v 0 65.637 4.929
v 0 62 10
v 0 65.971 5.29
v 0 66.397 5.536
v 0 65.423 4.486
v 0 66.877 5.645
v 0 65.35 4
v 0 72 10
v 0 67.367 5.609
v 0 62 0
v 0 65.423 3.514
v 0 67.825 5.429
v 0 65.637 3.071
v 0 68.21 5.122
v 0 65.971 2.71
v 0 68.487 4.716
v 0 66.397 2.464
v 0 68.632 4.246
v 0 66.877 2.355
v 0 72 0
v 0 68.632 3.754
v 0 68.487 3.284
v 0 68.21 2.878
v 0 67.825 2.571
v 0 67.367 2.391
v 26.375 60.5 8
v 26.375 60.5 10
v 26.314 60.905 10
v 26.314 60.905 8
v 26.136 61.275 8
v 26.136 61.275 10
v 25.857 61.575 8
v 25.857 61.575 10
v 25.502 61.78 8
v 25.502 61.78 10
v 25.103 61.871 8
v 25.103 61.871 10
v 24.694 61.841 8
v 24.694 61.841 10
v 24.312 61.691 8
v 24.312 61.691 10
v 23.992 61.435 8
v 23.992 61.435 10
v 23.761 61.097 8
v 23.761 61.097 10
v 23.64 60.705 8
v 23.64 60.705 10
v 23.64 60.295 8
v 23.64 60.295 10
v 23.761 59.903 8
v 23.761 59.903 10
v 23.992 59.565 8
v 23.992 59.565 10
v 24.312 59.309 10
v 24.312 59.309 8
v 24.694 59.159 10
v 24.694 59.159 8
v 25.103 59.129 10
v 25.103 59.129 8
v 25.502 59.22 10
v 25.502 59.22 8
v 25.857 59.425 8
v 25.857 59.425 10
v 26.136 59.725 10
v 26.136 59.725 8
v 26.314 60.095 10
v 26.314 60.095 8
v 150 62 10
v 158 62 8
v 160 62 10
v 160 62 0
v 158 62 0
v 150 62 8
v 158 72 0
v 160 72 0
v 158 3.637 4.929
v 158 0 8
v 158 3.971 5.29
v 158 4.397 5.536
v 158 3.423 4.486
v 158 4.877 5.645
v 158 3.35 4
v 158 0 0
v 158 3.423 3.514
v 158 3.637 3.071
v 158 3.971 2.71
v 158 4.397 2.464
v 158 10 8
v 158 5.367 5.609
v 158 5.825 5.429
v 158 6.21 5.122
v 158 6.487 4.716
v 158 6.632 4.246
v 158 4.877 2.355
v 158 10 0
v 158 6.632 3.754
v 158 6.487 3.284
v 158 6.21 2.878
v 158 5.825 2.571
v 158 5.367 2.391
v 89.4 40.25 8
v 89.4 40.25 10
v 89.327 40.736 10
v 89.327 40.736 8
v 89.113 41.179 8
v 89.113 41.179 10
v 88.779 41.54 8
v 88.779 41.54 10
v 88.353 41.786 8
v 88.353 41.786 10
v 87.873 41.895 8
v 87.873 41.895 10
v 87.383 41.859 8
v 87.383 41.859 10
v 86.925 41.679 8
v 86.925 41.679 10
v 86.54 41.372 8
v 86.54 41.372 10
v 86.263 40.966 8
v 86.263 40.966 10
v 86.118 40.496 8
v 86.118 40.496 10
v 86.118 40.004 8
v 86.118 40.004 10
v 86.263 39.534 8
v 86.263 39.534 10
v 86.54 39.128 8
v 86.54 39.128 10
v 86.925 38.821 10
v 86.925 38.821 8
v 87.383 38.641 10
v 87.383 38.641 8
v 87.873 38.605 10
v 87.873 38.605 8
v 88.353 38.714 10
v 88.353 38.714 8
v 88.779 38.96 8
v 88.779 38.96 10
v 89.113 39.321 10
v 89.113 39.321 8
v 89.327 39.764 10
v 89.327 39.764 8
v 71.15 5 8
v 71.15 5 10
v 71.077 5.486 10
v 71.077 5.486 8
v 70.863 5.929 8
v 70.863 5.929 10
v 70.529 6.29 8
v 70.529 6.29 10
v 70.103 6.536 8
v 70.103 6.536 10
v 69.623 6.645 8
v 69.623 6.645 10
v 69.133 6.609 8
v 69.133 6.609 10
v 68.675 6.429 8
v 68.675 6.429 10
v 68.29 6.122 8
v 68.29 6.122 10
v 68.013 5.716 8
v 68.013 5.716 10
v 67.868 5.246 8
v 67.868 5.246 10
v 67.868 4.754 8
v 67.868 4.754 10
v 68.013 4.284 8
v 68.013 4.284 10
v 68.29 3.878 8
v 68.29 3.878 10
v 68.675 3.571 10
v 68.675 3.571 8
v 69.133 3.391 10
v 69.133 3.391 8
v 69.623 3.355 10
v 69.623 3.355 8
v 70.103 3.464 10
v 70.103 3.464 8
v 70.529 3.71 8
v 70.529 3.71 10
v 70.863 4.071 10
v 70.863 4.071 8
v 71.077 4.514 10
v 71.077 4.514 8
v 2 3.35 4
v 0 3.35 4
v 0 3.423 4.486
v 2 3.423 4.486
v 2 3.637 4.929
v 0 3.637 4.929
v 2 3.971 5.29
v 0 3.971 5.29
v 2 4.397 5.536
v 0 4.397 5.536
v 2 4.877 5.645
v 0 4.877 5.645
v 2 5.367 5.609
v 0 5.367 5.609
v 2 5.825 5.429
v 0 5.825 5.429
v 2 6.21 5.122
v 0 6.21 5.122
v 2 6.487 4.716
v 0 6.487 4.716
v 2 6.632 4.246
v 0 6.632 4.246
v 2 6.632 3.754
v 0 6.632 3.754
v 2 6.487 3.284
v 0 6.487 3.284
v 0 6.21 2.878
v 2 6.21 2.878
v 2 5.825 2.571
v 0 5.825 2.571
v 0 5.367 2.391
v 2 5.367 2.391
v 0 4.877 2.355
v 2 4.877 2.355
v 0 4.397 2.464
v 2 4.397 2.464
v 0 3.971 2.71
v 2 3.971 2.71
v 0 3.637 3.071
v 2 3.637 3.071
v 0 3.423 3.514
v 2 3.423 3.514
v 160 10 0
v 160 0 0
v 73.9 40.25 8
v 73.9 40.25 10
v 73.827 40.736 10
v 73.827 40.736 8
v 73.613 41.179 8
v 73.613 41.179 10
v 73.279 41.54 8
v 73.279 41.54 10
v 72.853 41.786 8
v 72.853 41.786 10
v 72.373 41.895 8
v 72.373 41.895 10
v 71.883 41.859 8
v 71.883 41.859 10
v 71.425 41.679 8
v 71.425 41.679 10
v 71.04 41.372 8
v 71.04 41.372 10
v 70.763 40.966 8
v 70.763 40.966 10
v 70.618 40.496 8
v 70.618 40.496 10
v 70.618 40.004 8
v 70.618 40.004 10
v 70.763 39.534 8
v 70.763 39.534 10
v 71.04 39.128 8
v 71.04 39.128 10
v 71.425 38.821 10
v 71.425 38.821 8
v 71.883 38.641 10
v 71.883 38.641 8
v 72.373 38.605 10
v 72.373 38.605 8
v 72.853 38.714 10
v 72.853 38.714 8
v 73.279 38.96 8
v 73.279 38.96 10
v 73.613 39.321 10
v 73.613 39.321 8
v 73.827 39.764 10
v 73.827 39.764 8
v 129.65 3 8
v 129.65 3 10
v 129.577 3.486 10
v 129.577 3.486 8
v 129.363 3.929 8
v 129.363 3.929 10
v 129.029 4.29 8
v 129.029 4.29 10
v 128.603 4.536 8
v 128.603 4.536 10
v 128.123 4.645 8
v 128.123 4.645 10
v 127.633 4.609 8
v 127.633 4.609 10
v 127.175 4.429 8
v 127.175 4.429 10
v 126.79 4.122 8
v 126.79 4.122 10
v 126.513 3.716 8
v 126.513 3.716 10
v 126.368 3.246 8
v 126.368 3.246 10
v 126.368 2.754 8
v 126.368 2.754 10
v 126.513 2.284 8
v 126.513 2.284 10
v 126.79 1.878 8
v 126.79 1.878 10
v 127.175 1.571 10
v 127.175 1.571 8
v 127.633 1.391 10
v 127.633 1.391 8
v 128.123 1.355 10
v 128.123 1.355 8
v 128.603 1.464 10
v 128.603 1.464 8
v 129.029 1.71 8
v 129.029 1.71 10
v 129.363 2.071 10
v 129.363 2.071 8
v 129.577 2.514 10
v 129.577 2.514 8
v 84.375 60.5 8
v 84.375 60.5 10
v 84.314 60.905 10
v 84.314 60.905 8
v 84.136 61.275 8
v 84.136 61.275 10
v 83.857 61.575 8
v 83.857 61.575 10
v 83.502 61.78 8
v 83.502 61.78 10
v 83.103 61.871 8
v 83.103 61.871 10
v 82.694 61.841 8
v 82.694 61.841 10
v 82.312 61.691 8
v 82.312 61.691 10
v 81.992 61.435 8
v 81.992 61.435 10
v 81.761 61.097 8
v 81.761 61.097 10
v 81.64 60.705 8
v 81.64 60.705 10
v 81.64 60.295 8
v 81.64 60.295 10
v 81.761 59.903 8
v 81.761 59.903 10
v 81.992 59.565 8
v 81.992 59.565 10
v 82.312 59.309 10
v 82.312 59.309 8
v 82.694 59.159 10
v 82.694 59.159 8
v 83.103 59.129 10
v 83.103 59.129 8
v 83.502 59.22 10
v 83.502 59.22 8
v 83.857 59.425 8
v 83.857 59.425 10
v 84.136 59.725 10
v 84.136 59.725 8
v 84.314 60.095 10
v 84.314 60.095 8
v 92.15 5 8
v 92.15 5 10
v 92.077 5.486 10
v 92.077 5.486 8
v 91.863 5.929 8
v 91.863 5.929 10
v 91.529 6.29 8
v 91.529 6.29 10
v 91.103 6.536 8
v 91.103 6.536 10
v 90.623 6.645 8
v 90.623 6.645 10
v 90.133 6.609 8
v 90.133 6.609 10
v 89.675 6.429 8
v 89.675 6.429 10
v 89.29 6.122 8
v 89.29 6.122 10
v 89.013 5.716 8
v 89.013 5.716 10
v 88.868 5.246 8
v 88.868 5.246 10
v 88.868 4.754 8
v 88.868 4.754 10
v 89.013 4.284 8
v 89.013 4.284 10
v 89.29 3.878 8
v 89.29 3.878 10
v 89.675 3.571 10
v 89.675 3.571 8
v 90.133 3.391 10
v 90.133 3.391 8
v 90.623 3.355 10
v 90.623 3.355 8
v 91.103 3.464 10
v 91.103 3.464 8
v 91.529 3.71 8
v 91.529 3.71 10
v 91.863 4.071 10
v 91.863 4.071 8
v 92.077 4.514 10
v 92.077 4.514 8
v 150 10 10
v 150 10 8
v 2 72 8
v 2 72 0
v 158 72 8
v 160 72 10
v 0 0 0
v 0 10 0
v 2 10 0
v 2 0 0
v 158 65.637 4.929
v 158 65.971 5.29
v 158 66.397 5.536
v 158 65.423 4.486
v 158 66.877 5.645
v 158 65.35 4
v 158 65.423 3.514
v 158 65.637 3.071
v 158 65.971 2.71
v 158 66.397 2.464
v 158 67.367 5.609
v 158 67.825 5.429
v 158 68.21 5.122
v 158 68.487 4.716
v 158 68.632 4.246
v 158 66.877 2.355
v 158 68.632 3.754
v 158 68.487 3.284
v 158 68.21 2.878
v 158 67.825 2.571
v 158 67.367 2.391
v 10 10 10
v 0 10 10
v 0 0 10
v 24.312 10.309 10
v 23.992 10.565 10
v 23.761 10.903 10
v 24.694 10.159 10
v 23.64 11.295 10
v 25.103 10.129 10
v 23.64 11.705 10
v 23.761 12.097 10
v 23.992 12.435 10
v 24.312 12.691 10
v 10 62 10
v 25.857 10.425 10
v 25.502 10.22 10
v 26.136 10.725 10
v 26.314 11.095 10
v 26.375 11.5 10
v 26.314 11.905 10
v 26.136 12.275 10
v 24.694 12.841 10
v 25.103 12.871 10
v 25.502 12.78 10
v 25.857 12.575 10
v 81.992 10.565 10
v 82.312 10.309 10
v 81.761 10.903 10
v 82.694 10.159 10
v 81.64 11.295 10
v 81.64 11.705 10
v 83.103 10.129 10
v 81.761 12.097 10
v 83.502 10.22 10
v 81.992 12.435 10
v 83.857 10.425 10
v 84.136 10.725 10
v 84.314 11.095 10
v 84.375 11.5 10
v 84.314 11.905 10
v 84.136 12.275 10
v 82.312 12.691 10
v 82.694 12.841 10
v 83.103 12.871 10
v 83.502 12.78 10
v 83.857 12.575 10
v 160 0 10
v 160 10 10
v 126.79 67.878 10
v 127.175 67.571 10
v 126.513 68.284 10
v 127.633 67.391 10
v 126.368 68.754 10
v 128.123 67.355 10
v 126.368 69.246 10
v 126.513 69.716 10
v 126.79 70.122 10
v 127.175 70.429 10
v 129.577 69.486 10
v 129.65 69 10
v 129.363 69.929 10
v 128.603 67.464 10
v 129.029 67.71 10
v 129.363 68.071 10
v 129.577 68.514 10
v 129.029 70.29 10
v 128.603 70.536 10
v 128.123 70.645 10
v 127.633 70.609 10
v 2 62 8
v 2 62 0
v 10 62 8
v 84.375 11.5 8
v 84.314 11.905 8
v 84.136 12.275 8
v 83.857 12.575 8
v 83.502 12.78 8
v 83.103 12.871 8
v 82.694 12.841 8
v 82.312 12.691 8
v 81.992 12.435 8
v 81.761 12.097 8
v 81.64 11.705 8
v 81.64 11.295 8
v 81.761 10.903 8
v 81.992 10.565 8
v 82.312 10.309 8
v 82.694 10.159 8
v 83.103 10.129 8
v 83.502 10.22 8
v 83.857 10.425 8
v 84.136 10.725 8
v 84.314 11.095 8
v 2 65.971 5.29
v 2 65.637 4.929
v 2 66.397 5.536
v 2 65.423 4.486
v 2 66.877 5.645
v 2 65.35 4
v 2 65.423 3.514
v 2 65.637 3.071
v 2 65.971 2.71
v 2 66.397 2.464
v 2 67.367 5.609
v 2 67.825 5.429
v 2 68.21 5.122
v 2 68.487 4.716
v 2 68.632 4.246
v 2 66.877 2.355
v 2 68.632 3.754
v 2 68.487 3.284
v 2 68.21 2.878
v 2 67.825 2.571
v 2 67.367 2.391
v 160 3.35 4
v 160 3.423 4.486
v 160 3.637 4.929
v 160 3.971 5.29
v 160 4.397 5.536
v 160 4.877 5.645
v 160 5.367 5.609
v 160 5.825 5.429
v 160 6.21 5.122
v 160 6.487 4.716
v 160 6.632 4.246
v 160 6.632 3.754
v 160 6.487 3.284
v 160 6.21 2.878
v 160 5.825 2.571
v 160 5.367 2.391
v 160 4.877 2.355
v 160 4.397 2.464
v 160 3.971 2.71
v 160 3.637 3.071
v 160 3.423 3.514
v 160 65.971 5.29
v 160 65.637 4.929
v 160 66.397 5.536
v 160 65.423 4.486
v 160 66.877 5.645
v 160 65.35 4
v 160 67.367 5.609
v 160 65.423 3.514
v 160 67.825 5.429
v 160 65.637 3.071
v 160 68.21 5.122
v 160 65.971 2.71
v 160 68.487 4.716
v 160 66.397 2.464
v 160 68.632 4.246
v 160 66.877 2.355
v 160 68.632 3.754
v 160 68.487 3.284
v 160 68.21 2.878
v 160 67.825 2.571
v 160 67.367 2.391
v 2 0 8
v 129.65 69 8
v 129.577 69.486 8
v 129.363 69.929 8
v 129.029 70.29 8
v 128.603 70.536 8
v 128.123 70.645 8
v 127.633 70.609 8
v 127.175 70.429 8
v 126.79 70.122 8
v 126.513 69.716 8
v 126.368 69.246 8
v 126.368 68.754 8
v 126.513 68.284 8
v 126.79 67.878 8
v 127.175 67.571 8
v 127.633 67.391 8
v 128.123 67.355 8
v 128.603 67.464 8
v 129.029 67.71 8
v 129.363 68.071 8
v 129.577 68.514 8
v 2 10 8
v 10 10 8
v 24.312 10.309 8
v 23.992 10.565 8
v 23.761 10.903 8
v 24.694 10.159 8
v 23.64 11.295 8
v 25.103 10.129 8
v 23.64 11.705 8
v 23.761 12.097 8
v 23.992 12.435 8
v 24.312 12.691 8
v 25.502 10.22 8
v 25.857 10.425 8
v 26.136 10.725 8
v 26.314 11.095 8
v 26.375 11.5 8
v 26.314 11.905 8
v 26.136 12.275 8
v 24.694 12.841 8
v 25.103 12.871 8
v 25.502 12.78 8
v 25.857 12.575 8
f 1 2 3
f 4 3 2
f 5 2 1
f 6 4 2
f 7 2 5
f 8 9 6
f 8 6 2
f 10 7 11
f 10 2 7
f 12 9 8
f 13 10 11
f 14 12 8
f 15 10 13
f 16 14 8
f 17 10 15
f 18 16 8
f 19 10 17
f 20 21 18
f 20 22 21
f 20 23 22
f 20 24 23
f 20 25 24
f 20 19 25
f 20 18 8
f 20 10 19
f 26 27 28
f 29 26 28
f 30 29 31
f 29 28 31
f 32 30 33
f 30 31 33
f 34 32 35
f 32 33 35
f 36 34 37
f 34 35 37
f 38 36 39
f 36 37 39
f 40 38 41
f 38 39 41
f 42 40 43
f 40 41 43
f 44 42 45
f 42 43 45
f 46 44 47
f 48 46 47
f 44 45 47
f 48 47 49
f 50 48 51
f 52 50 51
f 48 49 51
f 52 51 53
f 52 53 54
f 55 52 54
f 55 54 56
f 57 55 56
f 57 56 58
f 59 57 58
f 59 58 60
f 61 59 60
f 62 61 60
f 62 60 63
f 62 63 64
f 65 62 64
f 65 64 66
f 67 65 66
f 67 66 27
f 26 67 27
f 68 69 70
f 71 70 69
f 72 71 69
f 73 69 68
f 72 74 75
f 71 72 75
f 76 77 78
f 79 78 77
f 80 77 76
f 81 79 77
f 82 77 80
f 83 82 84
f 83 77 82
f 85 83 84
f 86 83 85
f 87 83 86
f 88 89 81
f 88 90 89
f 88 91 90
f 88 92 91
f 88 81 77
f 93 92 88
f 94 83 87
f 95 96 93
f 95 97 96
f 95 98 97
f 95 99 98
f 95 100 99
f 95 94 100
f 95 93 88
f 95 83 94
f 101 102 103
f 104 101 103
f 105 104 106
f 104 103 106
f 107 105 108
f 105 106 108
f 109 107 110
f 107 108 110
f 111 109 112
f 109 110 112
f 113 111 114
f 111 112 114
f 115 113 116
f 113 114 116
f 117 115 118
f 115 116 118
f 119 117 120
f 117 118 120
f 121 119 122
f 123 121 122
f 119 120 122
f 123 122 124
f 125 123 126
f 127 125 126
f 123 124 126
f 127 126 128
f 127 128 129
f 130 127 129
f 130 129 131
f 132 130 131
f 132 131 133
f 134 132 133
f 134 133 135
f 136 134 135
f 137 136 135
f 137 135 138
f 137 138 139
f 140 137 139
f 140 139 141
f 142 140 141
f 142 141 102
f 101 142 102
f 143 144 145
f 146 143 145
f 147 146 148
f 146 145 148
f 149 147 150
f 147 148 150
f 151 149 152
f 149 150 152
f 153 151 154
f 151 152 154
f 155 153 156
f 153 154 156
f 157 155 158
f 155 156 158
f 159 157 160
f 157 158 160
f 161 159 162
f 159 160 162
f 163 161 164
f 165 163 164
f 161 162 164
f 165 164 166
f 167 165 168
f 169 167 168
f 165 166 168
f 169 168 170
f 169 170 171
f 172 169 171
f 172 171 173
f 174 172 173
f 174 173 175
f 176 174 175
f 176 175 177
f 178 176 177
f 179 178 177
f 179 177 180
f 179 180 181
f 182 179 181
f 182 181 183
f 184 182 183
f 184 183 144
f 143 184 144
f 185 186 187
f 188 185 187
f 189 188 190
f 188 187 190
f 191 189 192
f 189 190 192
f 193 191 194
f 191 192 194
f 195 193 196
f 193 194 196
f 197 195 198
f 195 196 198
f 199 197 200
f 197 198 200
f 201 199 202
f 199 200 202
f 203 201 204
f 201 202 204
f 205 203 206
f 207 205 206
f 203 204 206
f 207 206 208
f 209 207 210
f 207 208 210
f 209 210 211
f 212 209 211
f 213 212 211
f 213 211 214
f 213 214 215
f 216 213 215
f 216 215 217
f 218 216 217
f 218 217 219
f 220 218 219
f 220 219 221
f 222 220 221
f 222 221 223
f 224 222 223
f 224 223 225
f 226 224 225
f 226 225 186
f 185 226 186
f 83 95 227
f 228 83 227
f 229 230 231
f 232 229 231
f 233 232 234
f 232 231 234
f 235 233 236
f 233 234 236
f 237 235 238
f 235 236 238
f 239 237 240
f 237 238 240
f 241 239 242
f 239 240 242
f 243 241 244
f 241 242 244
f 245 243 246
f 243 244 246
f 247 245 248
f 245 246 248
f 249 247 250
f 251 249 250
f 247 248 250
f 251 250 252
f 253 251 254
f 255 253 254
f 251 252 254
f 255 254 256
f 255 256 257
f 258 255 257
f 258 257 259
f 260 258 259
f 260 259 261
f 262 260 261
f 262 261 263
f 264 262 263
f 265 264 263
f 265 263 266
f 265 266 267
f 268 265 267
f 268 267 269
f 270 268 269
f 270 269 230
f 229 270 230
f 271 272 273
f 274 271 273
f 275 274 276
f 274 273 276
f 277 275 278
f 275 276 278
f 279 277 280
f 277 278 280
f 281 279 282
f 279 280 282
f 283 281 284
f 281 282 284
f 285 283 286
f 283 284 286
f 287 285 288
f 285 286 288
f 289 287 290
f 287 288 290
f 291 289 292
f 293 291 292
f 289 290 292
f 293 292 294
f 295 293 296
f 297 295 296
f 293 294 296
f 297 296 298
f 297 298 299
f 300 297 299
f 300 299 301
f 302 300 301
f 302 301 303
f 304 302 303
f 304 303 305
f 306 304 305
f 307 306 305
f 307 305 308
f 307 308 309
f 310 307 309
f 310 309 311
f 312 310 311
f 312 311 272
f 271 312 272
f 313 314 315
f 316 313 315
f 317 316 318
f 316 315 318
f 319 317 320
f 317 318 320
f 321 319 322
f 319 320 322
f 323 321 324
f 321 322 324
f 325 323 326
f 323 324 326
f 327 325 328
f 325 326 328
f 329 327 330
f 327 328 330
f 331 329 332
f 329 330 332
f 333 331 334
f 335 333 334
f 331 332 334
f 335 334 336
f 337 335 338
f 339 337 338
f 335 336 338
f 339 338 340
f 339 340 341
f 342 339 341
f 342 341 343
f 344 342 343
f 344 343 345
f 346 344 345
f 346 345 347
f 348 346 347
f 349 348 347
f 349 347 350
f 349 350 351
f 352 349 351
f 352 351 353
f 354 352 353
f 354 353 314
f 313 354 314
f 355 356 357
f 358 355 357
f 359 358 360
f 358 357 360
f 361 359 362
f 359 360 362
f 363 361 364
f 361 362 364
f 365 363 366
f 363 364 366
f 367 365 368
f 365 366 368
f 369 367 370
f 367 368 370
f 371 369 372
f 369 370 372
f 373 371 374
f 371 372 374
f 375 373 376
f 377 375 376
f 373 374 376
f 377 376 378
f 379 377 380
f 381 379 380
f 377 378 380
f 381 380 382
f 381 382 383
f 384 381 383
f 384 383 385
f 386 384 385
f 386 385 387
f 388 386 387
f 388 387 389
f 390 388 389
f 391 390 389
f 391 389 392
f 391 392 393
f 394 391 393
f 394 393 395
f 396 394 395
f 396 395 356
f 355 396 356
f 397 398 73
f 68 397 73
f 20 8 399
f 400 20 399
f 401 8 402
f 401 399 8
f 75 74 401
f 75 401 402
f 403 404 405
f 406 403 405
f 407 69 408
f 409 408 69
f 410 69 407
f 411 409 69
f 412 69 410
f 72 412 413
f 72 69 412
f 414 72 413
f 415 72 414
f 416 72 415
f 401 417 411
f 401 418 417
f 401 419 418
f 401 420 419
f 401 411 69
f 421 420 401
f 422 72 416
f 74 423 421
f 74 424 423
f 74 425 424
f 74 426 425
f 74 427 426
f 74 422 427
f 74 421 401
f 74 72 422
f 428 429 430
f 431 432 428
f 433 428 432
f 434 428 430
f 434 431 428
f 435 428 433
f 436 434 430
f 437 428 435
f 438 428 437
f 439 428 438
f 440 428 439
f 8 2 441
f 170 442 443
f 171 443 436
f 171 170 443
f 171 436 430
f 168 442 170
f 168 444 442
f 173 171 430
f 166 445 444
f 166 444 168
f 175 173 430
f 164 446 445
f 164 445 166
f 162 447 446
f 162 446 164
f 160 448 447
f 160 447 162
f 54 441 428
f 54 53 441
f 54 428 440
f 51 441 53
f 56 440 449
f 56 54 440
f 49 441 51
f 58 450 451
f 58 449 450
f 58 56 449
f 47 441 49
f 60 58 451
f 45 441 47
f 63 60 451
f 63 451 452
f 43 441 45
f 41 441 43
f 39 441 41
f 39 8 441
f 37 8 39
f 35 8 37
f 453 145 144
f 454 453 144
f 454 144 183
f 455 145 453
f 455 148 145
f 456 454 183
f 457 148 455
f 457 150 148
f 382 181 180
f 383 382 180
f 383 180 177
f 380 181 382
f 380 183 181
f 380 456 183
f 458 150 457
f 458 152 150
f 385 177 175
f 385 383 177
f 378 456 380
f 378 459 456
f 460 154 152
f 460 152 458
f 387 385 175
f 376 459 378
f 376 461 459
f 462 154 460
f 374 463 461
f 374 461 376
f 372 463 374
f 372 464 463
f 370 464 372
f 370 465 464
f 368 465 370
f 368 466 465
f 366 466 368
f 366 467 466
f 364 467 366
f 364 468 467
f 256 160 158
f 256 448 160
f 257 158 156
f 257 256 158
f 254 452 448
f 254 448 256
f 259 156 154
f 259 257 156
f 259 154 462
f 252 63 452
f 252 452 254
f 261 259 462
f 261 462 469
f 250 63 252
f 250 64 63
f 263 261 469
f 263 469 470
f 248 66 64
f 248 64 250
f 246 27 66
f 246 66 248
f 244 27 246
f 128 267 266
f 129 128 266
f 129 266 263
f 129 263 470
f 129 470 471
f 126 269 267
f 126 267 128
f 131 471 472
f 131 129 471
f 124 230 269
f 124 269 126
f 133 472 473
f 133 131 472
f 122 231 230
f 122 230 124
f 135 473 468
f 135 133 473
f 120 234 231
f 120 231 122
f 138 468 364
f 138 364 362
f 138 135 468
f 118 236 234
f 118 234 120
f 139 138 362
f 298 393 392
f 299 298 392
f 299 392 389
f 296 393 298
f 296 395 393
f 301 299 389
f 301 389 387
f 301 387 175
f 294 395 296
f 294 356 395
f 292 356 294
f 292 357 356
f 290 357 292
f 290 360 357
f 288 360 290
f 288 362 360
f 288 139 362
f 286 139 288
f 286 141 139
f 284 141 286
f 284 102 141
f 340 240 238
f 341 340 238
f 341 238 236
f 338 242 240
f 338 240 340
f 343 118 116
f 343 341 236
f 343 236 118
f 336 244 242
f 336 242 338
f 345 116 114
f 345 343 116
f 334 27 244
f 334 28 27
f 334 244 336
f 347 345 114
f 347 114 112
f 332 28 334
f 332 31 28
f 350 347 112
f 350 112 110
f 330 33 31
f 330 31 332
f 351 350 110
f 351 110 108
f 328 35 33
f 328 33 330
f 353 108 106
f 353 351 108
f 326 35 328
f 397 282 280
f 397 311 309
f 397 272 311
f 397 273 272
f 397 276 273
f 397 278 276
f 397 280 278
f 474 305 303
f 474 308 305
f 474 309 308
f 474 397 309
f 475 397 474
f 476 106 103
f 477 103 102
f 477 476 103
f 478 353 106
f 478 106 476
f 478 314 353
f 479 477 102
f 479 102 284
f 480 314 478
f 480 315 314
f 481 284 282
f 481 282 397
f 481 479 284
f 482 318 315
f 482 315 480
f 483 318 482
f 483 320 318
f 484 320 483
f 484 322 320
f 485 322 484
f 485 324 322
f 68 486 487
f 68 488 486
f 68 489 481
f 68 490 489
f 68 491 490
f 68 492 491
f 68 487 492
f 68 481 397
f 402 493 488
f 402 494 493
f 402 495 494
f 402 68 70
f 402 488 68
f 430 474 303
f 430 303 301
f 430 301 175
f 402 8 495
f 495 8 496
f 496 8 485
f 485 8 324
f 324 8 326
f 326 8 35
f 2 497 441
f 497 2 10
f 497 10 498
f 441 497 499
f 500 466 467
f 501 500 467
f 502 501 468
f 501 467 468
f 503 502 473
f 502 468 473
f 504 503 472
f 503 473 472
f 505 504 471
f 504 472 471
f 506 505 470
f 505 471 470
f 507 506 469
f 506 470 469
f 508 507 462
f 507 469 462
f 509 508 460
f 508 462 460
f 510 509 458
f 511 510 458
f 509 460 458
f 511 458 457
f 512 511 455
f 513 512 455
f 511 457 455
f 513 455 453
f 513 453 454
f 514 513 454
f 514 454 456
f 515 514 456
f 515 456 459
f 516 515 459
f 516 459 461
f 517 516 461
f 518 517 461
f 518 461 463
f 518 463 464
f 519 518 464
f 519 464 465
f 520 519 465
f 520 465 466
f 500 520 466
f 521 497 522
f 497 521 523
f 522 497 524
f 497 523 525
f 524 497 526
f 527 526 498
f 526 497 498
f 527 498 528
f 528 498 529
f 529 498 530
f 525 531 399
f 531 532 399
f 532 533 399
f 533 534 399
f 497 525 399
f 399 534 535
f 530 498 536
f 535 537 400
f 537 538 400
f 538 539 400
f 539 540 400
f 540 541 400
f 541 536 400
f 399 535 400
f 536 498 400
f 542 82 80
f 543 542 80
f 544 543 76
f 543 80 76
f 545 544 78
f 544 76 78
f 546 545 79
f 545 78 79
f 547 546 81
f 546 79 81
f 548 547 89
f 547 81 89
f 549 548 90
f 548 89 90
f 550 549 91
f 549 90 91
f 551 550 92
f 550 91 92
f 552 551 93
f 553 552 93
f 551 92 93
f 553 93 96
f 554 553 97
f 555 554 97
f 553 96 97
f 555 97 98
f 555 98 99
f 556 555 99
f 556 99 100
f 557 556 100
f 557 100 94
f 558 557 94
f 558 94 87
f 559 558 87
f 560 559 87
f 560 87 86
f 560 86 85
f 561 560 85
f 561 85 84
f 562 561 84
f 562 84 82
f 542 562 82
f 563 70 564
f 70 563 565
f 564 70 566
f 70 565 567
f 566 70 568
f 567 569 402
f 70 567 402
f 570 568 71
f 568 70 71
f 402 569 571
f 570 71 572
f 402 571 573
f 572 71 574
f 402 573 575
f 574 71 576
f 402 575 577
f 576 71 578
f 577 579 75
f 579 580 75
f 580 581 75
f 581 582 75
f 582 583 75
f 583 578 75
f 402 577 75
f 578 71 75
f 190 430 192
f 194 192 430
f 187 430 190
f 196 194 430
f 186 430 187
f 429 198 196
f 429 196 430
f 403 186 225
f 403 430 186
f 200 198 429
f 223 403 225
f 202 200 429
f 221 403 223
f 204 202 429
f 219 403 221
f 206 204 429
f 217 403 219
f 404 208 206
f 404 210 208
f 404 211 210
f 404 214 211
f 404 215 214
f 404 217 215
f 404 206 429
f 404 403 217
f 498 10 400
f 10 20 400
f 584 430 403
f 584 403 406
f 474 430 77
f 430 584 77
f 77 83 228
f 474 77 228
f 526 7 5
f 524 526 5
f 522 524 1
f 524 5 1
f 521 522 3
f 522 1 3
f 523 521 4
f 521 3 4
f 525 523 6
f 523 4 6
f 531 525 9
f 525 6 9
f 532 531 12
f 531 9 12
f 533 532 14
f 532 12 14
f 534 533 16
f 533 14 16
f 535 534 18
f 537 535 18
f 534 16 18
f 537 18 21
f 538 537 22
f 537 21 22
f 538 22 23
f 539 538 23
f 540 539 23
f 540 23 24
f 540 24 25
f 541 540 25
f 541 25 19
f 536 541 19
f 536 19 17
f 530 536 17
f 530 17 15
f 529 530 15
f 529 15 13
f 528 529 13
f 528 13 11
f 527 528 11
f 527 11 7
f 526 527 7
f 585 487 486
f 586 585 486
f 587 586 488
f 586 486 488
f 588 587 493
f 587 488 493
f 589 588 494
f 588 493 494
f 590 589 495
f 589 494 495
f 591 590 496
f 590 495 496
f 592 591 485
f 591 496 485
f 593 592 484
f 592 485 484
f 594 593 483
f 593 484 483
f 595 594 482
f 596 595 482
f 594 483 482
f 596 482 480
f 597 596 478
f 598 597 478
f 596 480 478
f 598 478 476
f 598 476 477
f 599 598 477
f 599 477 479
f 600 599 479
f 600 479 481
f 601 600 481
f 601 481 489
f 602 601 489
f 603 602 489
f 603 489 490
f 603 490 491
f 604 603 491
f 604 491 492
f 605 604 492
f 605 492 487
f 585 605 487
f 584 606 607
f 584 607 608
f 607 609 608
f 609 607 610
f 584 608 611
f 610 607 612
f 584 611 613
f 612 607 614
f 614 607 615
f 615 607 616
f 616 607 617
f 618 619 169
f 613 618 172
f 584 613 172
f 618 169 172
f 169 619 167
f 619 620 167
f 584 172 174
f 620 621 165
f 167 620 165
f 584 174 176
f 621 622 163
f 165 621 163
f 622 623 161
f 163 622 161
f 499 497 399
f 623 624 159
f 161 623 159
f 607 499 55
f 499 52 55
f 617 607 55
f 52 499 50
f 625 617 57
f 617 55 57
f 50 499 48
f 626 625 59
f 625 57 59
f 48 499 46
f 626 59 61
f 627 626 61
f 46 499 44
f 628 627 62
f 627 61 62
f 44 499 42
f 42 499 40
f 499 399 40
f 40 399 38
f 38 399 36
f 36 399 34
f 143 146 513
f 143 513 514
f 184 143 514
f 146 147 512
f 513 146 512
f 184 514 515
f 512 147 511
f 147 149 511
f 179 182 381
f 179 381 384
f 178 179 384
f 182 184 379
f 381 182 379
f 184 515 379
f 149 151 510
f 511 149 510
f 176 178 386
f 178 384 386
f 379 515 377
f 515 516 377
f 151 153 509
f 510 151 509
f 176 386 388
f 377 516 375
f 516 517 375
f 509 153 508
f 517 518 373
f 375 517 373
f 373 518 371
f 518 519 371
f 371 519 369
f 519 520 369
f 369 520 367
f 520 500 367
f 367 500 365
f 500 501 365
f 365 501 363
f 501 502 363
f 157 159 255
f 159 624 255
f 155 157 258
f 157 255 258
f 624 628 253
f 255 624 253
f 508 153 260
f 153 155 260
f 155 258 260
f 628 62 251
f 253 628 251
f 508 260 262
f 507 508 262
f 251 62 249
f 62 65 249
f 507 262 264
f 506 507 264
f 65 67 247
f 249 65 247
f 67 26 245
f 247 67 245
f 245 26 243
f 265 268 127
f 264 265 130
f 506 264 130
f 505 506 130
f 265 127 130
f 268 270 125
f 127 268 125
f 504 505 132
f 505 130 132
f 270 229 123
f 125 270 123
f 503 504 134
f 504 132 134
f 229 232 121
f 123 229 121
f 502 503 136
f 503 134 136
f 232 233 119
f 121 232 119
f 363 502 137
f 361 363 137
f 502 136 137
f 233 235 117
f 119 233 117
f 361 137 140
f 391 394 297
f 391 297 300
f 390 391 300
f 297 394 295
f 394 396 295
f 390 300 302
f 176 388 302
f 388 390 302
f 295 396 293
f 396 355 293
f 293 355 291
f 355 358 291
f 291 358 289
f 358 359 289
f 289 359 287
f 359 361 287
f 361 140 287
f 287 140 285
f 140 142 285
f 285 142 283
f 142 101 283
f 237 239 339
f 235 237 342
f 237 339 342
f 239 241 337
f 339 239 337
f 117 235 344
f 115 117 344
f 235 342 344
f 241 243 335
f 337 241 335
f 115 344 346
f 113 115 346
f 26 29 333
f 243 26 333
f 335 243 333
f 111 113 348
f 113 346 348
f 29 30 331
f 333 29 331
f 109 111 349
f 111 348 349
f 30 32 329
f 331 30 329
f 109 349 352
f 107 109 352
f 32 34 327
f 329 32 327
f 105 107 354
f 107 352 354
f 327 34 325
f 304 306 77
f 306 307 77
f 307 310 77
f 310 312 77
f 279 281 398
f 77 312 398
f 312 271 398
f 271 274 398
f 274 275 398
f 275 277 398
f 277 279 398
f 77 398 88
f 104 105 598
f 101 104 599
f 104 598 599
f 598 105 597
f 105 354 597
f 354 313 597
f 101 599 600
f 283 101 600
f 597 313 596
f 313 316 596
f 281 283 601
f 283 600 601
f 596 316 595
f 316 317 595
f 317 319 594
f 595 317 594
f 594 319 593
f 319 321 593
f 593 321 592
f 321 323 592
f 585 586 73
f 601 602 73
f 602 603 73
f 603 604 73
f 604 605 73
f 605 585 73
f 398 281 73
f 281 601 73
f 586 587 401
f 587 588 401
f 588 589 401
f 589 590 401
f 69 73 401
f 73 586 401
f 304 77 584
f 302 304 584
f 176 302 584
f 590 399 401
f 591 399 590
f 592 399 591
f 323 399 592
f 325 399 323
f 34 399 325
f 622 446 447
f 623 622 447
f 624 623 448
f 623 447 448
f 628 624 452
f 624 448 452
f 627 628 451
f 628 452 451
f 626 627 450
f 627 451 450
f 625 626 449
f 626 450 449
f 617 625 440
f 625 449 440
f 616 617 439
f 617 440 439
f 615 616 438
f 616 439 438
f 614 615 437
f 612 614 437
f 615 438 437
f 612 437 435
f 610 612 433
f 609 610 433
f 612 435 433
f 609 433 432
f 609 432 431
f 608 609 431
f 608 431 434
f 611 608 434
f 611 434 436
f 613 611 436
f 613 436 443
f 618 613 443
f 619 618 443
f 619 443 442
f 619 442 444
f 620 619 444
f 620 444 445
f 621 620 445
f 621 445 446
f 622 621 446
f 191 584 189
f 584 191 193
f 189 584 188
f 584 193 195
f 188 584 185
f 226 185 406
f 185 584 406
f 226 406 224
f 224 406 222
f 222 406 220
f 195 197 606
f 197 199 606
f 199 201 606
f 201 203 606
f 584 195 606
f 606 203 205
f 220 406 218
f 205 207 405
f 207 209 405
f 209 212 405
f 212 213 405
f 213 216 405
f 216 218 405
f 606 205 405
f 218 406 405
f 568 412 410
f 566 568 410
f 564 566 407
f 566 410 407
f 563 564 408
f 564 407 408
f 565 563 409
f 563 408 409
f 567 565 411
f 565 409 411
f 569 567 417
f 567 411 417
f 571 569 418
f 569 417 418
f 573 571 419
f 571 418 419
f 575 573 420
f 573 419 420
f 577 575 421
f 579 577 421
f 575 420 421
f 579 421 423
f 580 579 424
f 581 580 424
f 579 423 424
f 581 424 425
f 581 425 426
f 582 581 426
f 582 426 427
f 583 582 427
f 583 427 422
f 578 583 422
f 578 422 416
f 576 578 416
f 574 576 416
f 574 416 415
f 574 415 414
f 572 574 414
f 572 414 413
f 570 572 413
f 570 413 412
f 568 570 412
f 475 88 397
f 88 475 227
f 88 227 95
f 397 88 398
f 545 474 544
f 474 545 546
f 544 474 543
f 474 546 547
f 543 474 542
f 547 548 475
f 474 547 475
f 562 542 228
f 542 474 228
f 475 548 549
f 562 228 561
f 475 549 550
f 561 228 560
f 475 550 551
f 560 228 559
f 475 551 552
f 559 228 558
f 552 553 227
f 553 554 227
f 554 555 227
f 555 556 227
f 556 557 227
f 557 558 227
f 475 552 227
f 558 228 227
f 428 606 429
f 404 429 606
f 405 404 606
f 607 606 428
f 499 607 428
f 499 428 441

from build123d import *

# Parameters (mm, degrees)
BOX002_W      = 156
BOX002_H      = 72
BOX002_DEPTH  = 8
BOX001_W      = 10
BOX001_H      = 52
BOX001_DEPTH  = 10
BOX_W         = 160
BOX_H         = 72
BOX_DEPTH     = 10
SKETCH_R      = 1.65
HOLE_DEPTH    = 160.001
SKETCH001_R   = 1.65
HOLE001_DEPTH = 10.001
SKETCH002_R   = 1.375
HOLE002_DEPTH = 10.001
SKETCH003_R   = 1.65
HOLE003_DEPTH = 25


with BuildPart() as w_rfel002:
    # Box002 → Box002 (new body)
    with BuildSketch(Plane(origin=(2, 0, 0), x_dir=(1, 0, 0), z_dir=(0, 0, 1))):
        with Locations((78, 36)):
            Rectangle(BOX002_W, BOX002_H)
    extrude(amount=BOX002_DEPTH)


with BuildPart() as w_rfel001:
    # Box001 → Box001 (new body)
    with BuildSketch(Plane(origin=(0, 10, 0), x_dir=(1, 0, 0), z_dir=(0, 0, 1))):
        with Locations((5, 26)):
            Rectangle(BOX001_W, BOX001_H)
    extrude(amount=BOX001_DEPTH)


with BuildPart() as part_mirroring:
    # Part__Mirroring: instance of Würfel001
    add(w_rfel001.part.mirror(Plane(origin=(80, 0, 0), x_dir=(0, -1, 0), z_dir=(1, 0, 0))))


with BuildPart() as body:
    # Box → Box (new body)
    with BuildSketch(Plane.XY):
        with Locations((80, 36)):
            Rectangle(BOX_W, BOX_H)
    extrude(amount=BOX_DEPTH)

    # Cut: cut Würfel001
    add(w_rfel001.part, mode=Mode.SUBTRACT)

    # Cut001: cut Part__Mirroring
    add(part_mirroring.part, mode=Mode.SUBTRACT)

    # Cut002: cut Würfel002
    add(w_rfel002.part, mode=Mode.SUBTRACT)

    # Sketch (on Face1 of BaseFeature) → Hole (cut, through all)
    with BuildSketch(Plane(origin=(0, 0, 0), x_dir=(0, -1, 0), z_dir=(-1, 0, 0))):
        with Locations((-5, 4)):
            Circle(SKETCH_R)
        with Locations((-67, 4)):
            Circle(SKETCH_R)
    extrude(amount=-HOLE_DEPTH, mode=Mode.SUBTRACT)

    # Sketch001 (on Face2 of Hole) → Hole001 (cut, through all)
    with BuildSketch(Plane.XY.offset(10)):
        with Locations((72.25, 40.25)):
            Circle(SKETCH001_R)
        with Locations((87.75, 40.25)):
            Circle(SKETCH001_R)
        with Locations((128, 69)):
            Circle(SKETCH001_R)
        with Locations((128, 3)):
            Circle(SKETCH001_R)
    extrude(amount=-HOLE001_DEPTH, mode=Mode.SUBTRACT)

    # Sketch002 (on Face2 of Hole) → Hole002 (cut, through all)
    with BuildSketch(Plane.XY.offset(10)):
        with Locations((25, 60.5)):
            Circle(SKETCH002_R)
        with Locations((83, 60.5)):
            Circle(SKETCH002_R)
        with Locations((25, 11.5)):
            Circle(SKETCH002_R)
        with Locations((83, 11.5)):
            Circle(SKETCH002_R)
    extrude(amount=-HOLE002_DEPTH, mode=Mode.SUBTRACT)

    # Sketch003 (on Face2 of Hole002) → Hole003 (cut)
    with BuildSketch(Plane.XY.offset(10)):
        with Locations((69.5, 5)):
            Circle(SKETCH003_R)
        with Locations((90.5, 5)):
            Circle(SKETCH003_R)
    extrude(amount=-HOLE003_DEPTH, mode=Mode.SUBTRACT)


solid = body.part
